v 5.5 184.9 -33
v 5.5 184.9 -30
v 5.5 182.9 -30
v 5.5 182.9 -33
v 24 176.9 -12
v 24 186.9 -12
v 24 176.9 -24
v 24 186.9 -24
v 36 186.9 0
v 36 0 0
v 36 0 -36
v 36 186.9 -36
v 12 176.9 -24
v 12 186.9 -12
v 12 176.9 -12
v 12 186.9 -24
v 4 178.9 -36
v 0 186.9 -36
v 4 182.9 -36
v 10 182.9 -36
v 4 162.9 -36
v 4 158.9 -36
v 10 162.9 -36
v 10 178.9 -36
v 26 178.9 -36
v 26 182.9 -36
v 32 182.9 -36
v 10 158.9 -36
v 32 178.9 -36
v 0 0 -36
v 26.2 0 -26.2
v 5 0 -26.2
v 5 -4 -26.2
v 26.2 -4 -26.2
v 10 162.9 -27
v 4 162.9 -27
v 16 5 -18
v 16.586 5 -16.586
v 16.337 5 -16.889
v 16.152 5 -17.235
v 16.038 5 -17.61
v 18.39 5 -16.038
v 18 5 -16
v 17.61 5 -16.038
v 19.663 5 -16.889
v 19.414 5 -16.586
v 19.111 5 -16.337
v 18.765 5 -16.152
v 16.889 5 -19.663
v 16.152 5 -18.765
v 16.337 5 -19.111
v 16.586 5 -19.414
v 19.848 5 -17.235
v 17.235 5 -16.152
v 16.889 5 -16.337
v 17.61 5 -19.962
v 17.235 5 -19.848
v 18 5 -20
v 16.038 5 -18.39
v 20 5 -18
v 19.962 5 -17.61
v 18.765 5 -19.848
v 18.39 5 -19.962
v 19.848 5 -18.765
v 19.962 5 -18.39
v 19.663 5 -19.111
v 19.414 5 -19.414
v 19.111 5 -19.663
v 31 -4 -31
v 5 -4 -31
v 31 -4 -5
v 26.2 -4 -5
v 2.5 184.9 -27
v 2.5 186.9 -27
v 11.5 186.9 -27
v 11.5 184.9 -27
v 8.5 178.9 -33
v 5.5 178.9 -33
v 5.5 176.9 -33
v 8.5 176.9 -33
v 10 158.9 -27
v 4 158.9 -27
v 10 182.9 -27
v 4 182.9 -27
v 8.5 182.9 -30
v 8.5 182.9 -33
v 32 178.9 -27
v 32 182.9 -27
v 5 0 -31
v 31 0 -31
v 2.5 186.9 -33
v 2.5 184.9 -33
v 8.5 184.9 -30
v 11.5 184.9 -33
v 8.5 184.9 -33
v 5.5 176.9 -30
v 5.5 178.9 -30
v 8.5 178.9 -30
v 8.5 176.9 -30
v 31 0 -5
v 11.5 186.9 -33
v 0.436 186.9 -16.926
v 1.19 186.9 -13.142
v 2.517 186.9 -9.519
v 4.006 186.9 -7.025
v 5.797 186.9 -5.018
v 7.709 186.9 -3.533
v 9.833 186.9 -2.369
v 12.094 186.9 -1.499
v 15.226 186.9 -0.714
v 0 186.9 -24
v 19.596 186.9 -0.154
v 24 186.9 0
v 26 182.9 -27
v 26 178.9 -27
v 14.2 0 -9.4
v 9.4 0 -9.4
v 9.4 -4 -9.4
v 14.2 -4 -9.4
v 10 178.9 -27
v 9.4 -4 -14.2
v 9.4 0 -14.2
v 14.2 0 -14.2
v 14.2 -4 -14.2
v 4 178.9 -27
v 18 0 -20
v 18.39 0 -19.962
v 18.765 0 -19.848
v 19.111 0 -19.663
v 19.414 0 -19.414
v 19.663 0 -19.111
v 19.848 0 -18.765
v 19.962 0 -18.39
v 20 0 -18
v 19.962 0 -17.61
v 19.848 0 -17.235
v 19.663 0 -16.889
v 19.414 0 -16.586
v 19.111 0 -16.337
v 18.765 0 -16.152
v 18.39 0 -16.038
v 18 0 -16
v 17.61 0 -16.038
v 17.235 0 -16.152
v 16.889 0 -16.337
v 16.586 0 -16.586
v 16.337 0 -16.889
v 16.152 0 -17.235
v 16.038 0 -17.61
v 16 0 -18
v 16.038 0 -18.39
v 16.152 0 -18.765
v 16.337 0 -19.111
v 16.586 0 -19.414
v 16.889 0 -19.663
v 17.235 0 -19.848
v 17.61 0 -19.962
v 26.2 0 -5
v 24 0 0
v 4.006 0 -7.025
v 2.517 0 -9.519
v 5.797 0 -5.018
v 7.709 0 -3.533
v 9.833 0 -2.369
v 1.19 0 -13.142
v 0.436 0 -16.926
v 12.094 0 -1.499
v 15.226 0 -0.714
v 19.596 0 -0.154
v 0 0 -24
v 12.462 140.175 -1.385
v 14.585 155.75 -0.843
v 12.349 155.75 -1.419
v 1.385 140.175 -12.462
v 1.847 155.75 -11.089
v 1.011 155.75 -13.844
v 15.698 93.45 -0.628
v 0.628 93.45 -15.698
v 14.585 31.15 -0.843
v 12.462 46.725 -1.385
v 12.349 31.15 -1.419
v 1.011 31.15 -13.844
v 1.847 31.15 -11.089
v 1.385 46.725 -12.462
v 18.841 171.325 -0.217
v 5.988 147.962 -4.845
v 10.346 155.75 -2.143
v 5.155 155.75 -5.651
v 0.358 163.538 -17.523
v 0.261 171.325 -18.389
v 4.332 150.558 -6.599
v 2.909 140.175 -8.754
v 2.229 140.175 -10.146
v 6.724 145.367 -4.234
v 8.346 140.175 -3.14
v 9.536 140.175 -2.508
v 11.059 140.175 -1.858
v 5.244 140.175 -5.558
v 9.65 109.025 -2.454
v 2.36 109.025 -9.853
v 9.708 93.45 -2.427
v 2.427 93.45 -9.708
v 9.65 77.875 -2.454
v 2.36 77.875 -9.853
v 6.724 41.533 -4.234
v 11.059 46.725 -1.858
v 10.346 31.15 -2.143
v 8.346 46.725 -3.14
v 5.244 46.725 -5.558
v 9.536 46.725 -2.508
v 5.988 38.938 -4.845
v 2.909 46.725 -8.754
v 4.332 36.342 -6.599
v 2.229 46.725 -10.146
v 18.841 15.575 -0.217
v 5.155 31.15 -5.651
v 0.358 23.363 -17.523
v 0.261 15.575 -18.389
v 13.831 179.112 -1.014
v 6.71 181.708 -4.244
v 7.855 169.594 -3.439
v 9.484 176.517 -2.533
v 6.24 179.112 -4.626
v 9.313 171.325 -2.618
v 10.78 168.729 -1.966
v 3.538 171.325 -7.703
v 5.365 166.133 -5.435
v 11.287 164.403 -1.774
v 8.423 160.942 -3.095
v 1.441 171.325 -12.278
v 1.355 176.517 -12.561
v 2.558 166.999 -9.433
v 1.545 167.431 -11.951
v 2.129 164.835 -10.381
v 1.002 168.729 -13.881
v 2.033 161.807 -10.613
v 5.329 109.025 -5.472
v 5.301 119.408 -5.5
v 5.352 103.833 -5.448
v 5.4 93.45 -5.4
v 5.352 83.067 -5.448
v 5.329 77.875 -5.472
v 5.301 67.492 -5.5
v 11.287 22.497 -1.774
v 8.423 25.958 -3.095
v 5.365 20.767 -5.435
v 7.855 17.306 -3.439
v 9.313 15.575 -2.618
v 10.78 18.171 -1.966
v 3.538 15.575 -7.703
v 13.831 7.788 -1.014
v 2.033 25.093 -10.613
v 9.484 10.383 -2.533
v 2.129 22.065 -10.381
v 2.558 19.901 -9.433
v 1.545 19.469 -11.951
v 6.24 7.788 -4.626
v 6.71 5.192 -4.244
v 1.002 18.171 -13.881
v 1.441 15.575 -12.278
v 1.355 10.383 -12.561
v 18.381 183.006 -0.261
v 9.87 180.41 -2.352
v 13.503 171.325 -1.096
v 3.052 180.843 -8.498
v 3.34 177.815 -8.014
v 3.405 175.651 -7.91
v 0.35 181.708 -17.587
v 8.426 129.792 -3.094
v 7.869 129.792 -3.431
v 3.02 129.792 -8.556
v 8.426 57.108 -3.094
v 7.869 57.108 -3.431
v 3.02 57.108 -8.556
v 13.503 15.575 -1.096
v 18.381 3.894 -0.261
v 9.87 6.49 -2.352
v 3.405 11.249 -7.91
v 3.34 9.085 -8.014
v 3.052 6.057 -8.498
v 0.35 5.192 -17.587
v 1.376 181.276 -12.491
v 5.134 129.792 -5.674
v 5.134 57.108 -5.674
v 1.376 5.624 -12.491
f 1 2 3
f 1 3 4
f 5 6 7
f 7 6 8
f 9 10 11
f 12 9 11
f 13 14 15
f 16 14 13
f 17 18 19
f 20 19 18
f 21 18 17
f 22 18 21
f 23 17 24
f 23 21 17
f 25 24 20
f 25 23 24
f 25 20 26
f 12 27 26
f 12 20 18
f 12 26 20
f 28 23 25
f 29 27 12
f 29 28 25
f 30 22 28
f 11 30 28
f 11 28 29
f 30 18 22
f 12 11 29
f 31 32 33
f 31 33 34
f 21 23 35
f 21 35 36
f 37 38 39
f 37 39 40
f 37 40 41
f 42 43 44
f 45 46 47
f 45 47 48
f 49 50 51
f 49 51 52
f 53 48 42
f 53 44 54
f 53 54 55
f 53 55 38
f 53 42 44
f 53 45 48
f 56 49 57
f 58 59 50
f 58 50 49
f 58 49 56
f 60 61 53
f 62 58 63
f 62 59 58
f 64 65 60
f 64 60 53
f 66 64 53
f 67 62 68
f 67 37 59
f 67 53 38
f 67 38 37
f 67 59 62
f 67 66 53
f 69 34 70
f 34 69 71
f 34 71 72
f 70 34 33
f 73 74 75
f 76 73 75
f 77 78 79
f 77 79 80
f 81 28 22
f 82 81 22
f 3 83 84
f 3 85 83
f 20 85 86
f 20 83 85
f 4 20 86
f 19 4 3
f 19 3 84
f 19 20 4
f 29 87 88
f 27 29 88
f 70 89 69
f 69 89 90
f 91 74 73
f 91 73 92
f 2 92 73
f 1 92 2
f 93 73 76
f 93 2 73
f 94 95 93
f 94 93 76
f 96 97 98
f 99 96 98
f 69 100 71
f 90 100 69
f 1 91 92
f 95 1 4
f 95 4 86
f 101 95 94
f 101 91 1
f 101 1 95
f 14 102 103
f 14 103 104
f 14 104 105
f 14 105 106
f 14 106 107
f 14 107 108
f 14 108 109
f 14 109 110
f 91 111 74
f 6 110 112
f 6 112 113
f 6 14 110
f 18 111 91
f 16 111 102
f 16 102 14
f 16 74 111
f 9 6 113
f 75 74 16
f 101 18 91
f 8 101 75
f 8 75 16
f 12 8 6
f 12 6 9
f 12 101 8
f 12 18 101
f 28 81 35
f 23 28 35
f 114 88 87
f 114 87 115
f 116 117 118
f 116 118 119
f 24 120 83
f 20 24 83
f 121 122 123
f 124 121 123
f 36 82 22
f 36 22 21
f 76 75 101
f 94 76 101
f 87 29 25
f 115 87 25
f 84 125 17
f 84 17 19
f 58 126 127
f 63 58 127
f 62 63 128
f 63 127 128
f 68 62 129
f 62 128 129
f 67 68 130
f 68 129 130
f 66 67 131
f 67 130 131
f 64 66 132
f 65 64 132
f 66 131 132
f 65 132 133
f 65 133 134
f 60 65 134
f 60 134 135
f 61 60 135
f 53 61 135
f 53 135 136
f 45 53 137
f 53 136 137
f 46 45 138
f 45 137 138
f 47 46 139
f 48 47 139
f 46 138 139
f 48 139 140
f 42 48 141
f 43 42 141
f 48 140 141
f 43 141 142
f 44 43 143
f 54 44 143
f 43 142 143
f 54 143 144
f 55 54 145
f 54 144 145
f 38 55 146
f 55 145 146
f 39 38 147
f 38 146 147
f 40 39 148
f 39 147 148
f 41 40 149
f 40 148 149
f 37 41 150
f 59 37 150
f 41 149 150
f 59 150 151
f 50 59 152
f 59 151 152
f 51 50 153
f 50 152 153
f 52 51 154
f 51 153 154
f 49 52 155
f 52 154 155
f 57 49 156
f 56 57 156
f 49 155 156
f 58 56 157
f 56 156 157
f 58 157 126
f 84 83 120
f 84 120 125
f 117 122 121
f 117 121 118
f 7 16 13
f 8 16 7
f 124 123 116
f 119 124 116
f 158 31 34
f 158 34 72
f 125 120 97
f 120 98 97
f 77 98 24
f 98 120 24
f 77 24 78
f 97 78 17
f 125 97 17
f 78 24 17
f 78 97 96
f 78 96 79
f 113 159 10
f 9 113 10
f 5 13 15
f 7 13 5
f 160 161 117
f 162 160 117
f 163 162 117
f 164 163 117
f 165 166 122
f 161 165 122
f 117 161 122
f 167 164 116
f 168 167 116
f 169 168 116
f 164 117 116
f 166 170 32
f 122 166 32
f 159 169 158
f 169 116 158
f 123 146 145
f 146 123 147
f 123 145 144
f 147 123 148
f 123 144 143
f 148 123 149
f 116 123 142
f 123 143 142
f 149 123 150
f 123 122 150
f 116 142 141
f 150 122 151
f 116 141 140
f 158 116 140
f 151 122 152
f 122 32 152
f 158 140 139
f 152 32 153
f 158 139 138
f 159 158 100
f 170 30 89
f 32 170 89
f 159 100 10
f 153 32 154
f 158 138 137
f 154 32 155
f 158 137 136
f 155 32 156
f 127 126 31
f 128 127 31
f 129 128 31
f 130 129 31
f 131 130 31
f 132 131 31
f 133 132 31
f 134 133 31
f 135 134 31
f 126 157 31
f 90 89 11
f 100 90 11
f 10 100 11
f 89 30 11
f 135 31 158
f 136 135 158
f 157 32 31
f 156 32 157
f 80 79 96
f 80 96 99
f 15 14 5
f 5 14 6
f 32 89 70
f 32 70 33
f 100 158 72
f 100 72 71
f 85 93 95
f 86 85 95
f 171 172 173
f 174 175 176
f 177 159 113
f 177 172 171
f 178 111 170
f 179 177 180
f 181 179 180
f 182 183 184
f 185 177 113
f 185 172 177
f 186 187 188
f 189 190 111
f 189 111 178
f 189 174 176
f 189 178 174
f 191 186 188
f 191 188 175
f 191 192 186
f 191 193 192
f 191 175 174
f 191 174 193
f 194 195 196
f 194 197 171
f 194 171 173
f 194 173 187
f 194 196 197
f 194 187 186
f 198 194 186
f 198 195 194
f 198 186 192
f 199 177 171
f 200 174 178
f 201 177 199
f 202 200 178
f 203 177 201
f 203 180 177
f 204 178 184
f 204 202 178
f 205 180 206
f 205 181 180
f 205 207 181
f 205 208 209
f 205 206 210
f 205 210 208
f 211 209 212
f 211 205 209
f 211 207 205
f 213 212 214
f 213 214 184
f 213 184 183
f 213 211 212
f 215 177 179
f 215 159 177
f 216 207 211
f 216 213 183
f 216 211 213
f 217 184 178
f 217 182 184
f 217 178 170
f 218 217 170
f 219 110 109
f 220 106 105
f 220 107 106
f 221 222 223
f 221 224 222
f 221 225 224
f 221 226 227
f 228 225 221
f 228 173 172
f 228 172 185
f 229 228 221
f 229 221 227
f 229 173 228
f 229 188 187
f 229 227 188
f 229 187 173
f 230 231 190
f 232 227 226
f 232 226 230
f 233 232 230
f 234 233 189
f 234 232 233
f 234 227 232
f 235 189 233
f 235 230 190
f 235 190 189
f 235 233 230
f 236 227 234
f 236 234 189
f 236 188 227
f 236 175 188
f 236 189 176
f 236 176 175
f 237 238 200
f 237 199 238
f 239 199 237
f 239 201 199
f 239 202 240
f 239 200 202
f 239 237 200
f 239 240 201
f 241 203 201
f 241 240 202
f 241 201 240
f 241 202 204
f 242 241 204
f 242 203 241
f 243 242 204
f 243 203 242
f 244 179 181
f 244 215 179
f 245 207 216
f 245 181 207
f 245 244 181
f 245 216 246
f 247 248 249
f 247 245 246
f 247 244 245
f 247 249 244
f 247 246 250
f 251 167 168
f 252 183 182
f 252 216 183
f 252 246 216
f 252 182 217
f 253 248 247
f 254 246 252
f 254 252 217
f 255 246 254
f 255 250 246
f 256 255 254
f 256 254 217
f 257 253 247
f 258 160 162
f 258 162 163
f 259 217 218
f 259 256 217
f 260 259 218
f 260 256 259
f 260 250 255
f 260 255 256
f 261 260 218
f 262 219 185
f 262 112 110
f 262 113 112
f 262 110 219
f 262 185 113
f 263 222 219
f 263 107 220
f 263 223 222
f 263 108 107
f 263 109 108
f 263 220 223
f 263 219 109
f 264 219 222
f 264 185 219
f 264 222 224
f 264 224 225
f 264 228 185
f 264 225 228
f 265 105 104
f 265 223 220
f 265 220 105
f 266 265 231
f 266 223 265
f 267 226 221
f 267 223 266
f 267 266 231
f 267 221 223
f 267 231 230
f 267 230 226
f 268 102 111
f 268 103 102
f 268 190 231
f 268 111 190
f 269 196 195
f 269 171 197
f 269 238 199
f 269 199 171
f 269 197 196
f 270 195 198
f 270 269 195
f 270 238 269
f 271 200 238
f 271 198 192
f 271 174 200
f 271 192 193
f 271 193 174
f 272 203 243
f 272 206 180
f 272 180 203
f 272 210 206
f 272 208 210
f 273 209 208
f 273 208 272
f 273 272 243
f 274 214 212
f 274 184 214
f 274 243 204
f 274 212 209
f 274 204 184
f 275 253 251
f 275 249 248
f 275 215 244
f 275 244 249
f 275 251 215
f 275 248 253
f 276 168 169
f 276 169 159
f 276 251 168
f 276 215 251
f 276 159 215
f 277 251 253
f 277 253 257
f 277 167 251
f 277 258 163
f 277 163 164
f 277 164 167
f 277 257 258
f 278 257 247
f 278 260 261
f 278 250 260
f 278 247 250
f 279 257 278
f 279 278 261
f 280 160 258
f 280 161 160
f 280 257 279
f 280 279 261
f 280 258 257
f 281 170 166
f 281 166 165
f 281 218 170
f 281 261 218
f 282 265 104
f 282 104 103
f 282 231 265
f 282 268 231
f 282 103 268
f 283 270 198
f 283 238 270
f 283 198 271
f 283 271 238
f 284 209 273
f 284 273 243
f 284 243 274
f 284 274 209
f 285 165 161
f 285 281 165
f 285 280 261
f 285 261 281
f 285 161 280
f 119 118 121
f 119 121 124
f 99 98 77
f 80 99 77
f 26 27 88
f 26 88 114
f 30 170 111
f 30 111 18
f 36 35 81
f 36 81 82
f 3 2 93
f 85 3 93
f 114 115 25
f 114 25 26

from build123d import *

# Parameters (mm, degrees)
SKETCH1_W           = 36
SKETCH1_H           = 36
BOSS_EXTRUDE1_DEPTH = 186.9
FILLET1_SIZE        = 24
SKETCH2_R           = 2
CUT_EXTRUDE1_DEPTH  = 5
SKETCH3_W           = 4.8
SKETCH3_H           = 4.8
BOSS_EXTRUDE2_DEPTH = 4
SKETCH4_W           = 6
SKETCH4_H           = 4
CUT_EXTRUDE2_DEPTH  = 9
SKETCH5_W           = 3
SKETCH5_H           = 3
SKETCH5_W_2         = 12
SKETCH5_H_2         = 12
CUT_EXTRUDE3_DEPTH  = 10
SKETCH6_W           = 9
SKETCH6_H           = 6
CUT_EXTRUDE4_DEPTH  = 2


with BuildPart() as part:
    # Sketch1 → Boss-Extrude1 (new body)
    with BuildSketch(Plane(origin=(0, 0, 0), x_dir=(1, 0, 0), z_dir=(0, 1, 0))):
        with Locations((18, 18)):
            Rectangle(SKETCH1_W, SKETCH1_H)
    extrude(amount=BOSS_EXTRUDE1_DEPTH)

    # Fillet1
    # a fillet whose section is not a circle: 24 mm, written as the material it takes off along each edge
    with BuildSketch(Plane(origin=(0, -60, 0), x_dir=(1, 0, 0), z_dir=(0, 1, 0))) as fillet1_piece_1:
        with BuildLine():
            Bezier((FILLET1_SIZE, 0), (0, 0), (0, FILLET1_SIZE), weights=[1, 1.222222222, 1])
            Line((0, FILLET1_SIZE), (0, 0))
            Line((0, 0), (FILLET1_SIZE, 0))
        make_face()
    extrude(amount=306.9, mode=Mode.SUBTRACT)

    # Sketch2 → Cut-Extrude1 (cut)
    with BuildSketch(Plane.XZ):
        with Locations(Location((18, -18, 0), (0, 0, 270))):
            Circle(SKETCH2_R)
    extrude(amount=-CUT_EXTRUDE1_DEPTH, mode=Mode.SUBTRACT)

    # Sketch3 → Boss-Extrude2 (add)
    with BuildSketch(Plane.XZ):
        Polygon((26.2, -5), (31, -5), (31, -31), (26, -31), (5, -31), (5, -26.2), (26.2, -26.2), align=None)
        with Locations((11.8, -11.8)):
            Rectangle(SKETCH3_W, SKETCH3_H)
    extrude(amount=BOSS_EXTRUDE2_DEPTH)

    # Sketch4 → Cut-Extrude2 (cut)
    with BuildSketch(Plane(origin=(0, 0, -36), x_dir=(-1, 0, 0), z_dir=(0, 0, -1))):
        with Locations((-7, 180.9)):
            Rectangle(SKETCH4_W, SKETCH4_H)
        with Locations((-29, 180.9)):
            Rectangle(SKETCH4_W, SKETCH4_H)
        with Locations((-7, 160.9)):
            Rectangle(SKETCH4_W, SKETCH4_H)
    extrude(amount=-CUT_EXTRUDE2_DEPTH, mode=Mode.SUBTRACT)

    # Sketch5 → Cut-Extrude3 (cut)
    with BuildSketch(Plane(origin=(0, 186.9, 0), x_dir=(1, 0, 0), z_dir=(0, 1, 0))):
        with Locations((7, 31.5)):
            Rectangle(SKETCH5_W, SKETCH5_H)
        with Locations((18, 18)):
            Rectangle(SKETCH5_W_2, SKETCH5_H_2)
    extrude(amount=-CUT_EXTRUDE3_DEPTH, mode=Mode.SUBTRACT)

    # Sketch6 → Cut-Extrude4 (cut)
    with BuildSketch(Plane(origin=(0, 186.9, 0), x_dir=(1, 0, 0), z_dir=(0, 1, 0))):
        with Locations((7, 30)):
            Rectangle(SKETCH6_W, SKETCH6_H)
    extrude(amount=-CUT_EXTRUDE4_DEPTH, mode=Mode.SUBTRACT)


solid = part.part
